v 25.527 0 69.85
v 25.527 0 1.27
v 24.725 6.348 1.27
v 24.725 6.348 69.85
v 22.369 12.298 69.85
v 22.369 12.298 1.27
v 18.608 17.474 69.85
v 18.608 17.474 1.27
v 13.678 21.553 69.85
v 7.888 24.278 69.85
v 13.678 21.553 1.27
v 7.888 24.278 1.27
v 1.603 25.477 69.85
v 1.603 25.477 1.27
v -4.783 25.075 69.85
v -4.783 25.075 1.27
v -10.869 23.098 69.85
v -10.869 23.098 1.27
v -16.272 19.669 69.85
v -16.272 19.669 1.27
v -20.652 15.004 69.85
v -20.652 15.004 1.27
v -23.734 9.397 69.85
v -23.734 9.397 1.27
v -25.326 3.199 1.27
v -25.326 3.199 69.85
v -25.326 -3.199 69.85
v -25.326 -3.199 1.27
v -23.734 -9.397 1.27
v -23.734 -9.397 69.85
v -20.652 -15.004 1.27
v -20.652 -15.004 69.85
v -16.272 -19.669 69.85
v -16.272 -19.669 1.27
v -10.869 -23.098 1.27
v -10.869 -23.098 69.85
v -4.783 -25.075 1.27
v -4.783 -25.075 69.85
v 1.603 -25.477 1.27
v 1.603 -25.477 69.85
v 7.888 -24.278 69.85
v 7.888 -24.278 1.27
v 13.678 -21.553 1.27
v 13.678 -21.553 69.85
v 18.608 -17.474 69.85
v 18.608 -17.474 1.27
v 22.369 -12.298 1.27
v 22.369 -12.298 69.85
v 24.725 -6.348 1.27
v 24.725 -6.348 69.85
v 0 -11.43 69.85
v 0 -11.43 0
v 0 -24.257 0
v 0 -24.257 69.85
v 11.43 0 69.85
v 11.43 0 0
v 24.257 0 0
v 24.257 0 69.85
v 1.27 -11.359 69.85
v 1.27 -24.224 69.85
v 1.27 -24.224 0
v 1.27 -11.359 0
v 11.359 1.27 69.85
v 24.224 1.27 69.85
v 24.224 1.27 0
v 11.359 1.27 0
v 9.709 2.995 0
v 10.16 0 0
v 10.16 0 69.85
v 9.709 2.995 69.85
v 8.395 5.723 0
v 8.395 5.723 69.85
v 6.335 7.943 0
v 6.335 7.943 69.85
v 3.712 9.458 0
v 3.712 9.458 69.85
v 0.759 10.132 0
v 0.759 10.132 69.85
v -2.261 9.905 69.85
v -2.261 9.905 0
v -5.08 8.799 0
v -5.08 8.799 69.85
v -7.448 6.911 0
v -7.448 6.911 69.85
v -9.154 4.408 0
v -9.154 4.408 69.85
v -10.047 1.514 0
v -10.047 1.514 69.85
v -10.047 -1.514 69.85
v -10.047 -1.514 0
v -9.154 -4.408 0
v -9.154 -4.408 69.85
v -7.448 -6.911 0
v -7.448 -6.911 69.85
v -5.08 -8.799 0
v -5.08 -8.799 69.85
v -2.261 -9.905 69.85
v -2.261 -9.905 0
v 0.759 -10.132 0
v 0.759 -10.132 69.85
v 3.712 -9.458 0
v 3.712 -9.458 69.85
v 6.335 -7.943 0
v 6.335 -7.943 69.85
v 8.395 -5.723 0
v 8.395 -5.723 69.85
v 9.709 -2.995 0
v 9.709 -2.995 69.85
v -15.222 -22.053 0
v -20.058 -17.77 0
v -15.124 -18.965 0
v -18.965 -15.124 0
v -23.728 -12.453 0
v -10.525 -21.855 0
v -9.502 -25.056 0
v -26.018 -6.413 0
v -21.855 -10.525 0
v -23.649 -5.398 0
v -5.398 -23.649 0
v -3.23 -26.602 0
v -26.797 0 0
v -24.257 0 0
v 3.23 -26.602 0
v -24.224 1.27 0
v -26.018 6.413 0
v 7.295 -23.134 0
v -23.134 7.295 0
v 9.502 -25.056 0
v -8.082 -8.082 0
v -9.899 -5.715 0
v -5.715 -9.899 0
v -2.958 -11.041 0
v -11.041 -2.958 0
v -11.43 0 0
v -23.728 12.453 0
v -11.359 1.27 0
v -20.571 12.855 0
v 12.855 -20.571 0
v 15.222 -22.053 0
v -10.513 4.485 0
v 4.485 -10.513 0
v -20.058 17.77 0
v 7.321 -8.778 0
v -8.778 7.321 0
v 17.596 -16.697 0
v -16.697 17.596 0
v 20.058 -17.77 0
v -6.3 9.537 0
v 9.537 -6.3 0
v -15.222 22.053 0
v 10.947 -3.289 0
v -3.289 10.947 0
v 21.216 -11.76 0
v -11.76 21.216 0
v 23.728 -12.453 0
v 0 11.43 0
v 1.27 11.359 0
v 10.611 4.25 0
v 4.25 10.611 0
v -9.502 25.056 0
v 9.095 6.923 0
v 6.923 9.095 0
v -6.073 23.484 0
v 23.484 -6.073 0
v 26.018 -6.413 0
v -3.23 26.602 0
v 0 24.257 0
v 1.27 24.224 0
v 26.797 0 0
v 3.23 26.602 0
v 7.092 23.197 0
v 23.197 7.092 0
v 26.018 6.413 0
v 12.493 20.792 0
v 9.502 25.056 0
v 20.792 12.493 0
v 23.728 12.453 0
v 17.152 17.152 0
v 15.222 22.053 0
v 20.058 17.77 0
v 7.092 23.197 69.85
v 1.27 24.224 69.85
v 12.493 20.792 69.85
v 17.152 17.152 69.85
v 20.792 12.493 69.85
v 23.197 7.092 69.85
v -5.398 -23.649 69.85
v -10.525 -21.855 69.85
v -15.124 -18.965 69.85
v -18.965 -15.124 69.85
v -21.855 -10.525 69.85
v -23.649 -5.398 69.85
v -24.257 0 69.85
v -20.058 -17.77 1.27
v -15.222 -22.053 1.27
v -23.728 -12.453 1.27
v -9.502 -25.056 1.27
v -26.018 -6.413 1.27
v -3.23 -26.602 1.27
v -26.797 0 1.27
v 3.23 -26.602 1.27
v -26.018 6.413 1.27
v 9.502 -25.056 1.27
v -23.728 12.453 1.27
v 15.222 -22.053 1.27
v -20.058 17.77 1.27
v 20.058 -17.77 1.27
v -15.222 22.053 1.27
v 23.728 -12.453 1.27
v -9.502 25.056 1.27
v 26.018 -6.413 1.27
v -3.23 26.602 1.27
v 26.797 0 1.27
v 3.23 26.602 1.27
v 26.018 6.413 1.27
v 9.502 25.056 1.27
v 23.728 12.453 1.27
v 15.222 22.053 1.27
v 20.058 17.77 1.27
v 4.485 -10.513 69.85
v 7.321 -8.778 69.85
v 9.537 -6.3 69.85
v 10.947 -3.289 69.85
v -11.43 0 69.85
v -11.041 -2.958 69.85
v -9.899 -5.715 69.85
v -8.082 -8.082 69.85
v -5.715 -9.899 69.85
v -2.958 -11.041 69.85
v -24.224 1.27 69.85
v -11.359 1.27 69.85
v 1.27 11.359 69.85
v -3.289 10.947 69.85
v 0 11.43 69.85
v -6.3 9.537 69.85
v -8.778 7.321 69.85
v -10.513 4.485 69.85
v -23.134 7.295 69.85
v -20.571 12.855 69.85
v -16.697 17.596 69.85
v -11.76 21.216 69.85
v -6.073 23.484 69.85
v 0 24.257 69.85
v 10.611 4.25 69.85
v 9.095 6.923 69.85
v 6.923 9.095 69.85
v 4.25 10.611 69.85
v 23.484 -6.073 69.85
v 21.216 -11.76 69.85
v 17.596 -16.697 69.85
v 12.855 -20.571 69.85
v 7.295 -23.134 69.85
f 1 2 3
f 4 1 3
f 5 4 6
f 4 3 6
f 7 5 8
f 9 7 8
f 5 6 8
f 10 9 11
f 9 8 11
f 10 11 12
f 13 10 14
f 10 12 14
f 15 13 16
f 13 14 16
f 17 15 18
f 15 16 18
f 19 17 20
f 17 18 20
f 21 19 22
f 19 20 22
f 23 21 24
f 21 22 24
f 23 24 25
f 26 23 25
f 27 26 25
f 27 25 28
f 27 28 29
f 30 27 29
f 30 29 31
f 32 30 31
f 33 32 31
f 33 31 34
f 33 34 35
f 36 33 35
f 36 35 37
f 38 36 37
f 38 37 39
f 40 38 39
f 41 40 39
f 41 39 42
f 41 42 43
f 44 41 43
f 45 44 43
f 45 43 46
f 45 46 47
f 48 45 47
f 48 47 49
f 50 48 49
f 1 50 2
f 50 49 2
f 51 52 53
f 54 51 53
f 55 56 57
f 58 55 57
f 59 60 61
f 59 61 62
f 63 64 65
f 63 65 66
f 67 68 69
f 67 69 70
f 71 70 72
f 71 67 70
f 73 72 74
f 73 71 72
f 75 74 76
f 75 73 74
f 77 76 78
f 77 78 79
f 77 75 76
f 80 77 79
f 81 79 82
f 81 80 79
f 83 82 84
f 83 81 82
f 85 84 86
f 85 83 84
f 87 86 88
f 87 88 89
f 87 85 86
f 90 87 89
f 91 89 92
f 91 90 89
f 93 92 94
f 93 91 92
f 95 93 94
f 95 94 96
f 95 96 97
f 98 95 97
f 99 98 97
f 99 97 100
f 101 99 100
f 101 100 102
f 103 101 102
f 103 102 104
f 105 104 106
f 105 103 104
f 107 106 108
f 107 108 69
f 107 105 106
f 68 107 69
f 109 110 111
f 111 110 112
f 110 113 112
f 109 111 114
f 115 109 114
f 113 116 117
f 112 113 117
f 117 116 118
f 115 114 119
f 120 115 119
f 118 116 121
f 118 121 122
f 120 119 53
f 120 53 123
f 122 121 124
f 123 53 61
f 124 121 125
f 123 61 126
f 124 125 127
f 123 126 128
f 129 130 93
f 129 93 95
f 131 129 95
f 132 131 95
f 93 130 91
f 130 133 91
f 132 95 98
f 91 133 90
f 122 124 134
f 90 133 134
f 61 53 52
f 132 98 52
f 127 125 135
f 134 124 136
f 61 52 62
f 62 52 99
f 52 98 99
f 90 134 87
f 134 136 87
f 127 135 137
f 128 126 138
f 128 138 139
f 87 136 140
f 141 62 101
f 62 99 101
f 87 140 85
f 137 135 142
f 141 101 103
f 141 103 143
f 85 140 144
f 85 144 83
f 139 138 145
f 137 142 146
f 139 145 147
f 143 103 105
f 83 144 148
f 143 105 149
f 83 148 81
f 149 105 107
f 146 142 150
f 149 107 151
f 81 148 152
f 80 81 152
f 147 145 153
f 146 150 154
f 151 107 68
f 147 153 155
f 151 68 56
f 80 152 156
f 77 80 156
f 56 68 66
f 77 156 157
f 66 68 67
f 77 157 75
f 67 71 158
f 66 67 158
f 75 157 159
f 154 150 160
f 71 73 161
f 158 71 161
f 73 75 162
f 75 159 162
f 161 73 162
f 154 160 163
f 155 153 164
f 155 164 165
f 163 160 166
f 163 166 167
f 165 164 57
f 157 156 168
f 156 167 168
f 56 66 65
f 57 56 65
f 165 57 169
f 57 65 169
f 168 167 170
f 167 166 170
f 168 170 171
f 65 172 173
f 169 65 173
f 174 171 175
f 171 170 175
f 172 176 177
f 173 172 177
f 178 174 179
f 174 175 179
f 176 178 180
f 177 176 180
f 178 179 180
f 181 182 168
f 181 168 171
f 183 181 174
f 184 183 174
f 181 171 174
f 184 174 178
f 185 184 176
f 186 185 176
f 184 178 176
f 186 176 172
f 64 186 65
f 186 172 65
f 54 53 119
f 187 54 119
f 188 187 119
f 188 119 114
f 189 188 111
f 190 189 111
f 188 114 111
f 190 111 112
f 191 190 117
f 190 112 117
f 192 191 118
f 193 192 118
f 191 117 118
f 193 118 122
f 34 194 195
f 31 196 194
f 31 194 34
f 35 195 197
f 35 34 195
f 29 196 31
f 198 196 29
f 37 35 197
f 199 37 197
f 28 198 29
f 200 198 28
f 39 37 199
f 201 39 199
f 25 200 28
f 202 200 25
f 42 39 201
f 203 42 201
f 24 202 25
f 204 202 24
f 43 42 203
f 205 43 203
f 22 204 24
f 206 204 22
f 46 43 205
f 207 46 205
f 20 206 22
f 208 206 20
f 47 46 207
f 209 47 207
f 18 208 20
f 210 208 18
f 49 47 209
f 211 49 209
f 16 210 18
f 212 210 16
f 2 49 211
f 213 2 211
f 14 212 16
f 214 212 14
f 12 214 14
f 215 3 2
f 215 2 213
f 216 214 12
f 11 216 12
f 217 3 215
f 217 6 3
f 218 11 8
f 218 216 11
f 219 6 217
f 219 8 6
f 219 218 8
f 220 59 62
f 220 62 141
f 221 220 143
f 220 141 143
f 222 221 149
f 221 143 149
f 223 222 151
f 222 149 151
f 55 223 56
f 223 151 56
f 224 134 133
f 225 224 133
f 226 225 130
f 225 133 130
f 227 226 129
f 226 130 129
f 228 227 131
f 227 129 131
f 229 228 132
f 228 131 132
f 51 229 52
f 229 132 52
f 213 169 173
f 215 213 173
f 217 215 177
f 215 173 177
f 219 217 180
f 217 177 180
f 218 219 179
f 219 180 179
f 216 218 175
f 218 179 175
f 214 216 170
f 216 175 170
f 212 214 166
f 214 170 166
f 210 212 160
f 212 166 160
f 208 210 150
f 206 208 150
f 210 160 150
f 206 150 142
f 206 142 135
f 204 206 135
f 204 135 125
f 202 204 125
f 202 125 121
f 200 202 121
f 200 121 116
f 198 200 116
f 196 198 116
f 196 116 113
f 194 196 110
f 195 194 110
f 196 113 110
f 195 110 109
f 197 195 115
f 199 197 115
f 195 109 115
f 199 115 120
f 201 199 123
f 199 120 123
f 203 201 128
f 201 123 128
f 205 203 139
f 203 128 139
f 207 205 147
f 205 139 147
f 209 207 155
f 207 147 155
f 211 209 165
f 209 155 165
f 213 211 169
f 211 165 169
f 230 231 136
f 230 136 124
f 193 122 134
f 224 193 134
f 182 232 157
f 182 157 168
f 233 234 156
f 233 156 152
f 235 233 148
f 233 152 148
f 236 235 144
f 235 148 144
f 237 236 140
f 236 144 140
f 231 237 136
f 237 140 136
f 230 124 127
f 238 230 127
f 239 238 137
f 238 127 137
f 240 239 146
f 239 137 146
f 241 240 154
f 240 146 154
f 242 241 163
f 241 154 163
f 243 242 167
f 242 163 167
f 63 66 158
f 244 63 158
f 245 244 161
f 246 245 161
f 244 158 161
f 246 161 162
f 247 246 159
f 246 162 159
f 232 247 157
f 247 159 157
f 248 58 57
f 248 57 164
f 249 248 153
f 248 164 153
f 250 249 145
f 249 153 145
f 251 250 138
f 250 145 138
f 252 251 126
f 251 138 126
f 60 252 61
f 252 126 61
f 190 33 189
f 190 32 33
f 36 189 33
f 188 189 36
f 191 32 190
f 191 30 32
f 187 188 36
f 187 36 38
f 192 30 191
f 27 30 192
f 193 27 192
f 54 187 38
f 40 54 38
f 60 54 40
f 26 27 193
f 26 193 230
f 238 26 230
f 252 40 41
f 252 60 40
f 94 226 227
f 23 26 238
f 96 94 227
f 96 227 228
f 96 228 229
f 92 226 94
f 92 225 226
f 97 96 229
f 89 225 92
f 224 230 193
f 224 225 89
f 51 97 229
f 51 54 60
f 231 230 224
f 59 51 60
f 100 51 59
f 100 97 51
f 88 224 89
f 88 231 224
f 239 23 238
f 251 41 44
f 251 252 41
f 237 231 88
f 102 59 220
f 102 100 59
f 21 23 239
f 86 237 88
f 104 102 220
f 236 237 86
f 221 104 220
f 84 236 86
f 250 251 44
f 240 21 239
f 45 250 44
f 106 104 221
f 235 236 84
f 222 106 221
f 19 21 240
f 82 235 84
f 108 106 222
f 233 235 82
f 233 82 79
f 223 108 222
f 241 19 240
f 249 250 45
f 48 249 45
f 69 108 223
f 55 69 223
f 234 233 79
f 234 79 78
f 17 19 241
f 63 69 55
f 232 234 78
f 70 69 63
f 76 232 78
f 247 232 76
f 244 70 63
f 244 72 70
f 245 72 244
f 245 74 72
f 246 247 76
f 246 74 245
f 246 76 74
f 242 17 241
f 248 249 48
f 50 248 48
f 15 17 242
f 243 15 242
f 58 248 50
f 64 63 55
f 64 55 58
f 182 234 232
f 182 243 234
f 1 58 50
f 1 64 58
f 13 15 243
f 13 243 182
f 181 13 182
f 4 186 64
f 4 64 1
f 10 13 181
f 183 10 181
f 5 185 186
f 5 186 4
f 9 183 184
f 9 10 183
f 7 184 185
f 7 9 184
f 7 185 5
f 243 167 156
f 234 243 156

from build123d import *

# Parameters (mm, degrees)
F0_R     = 25.527
F0_R_2   = 10.16
F1_DEPTH = 69.85
F0_R_3   = 26.797
F2_DEPTH = 1.27


with BuildPart() as f1:
    # F0 (on Top) → F1 (new body)
    with BuildSketch(Plane.XY):
        Circle(F0_R)
        with BuildLine():
            ThreePointArc((24.223731, 1.27), (24.248681, 0.635218), (24.257, 0))
            ThreePointArc((24.257, 0), (17.595574, -16.69724), (1.27, -24.223731))
            ThreePointArc((1.27, -24.223731), (0.635218, -24.248681), (0, -24.257))
            ThreePointArc((0, -24.257), (-17.152289, -17.152289), (-24.257, 0))
            ThreePointArc((-24.257, 0), (-24.248681, 0.635218), (-24.223731, 1.27))
            ThreePointArc((-24.223731, 1.27), (-16.69724, 17.595574), (0, 24.257))
            ThreePointArc((0, 24.257), (0.635218, 24.248681), (1.27, 24.223731))
            ThreePointArc((1.27, 24.223731), (17.152289, 17.152289), (24.223731, 1.27))
        make_face(mode=Mode.SUBTRACT)
        with BuildLine():
            ThreePointArc((1.27, -11.359225), (8.519419, -7.62), (11.43, 0))
            ThreePointArc((11.43, 0), (11.412293, 0.635985), (11.359225, 1.27))
            ThreePointArc((11.359225, 1.27), (8.082231, 8.082231), (1.27, 11.359225))
            ThreePointArc((1.27, 11.359225), (0.635985, 11.412293), (0, 11.43))
            ThreePointArc((0, 11.43), (-7.62, 8.519419), (-11.359225, 1.27))
            ThreePointArc((-11.359225, 1.27), (-11.412293, 0.635985), (-11.43, 0))
            ThreePointArc((-11.43, 0), (-8.082231, -8.082231), (0, -11.43))
            ThreePointArc((0, -11.43), (0.635985, -11.412293), (1.27, -11.359225))
        make_face()
        Circle(F0_R_2, mode=Mode.SUBTRACT)
        with BuildLine():
            Line((1.27, 11.359225), (1.27, 24.223731))
            ThreePointArc((1.27, 24.223731), (0.635218, 24.248681), (0, 24.257))
            Line((0, 24.257), (0, 11.43))
            ThreePointArc((0, 11.43), (0.635985, 11.412293), (1.27, 11.359225))
        make_face()
        with BuildLine():
            Line((11.43, 0), (24.257, 0))
            ThreePointArc((24.257, 0), (24.248681, 0.635218), (24.223731, 1.27))
            Line((24.223731, 1.27), (11.359225, 1.27))
            ThreePointArc((11.359225, 1.27), (11.412293, 0.635985), (11.43, 0))
        make_face()
        with BuildLine():
            ThreePointArc((0, -24.257), (0.635218, -24.248681), (1.27, -24.223731))
            Line((1.27, -24.223731), (1.27, -11.359225))
            ThreePointArc((1.27, -11.359225), (0.635985, -11.412293), (0, -11.43))
            Line((0, -11.43), (0, -24.257))
        make_face()
        with BuildLine():
            ThreePointArc((-24.223731, 1.27), (-24.248681, 0.635218), (-24.257, 0))
            Line((-24.257, 0), (-11.43, 0))
            ThreePointArc((-11.43, 0), (-11.412293, 0.635985), (-11.359225, 1.27))
            Line((-11.359225, 1.27), (-24.223731, 1.27))
        make_face()
    extrude(amount=F1_DEPTH)

    # F0 (on Top) → F2 (join)
    with BuildSketch(Plane.XY):
        Circle(F0_R_3)
        Circle(F0_R, mode=Mode.SUBTRACT)
    extrude(amount=F2_DEPTH)


solid = f1.part
